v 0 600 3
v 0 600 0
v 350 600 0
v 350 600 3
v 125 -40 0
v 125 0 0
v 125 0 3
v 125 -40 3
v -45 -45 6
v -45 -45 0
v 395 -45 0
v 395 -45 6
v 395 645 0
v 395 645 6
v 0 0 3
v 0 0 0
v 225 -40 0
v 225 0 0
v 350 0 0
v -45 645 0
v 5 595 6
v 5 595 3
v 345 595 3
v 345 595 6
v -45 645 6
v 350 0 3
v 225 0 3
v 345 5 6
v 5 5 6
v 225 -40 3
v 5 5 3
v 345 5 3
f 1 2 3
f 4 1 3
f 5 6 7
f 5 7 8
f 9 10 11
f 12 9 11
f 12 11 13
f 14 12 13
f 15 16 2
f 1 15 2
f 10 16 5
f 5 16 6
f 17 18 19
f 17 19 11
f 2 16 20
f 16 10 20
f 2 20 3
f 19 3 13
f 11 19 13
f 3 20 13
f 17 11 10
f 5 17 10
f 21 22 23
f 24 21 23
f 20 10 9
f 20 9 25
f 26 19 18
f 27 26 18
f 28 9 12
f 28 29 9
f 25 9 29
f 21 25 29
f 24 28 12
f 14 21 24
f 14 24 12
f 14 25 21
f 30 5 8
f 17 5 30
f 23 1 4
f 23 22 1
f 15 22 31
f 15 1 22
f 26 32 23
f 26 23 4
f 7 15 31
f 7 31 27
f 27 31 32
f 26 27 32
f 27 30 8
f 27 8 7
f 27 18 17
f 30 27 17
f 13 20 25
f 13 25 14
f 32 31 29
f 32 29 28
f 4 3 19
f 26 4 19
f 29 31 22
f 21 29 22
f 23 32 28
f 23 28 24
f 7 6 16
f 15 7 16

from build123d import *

# Parameters (mm, degrees)
F0_W     = 440
F0_H     = 690
F0_W_2   = 340
F0_H_2   = 590
F1_DEPTH = 6
F2_W     = 100
F2_H     = 40
F2_W_2   = 340
F2_H_2   = 590
F3_DEPTH = 3


with BuildPart() as f1:
    # F0 (on Top) → F1 (new body)
    with BuildSketch(Plane.XY):
        with Locations((175, 300)):
            Rectangle(F0_W, F0_H)
        with Locations((175, 300)):
            Rectangle(F0_W_2, F0_H_2, mode=Mode.SUBTRACT)
    extrude(amount=F1_DEPTH)

    # F2 (on face) → F3 (cut)
    with BuildSketch(Plane(origin=(0, 0, 0), x_dir=(1, 0, 0), z_dir=(0, 0, -1))):
        with Locations((175, 20)):
            Rectangle(F2_W, F2_H)
        Polygon((0, -600), (350, -600), (350, 0), (225, 0), (125, 0), (0, 0), align=None)
        with Locations((175, -300)):
            Rectangle(F2_W_2, F2_H_2, mode=Mode.SUBTRACT)
    extrude(amount=-F3_DEPTH, mode=Mode.SUBTRACT)


solid = f1.part
